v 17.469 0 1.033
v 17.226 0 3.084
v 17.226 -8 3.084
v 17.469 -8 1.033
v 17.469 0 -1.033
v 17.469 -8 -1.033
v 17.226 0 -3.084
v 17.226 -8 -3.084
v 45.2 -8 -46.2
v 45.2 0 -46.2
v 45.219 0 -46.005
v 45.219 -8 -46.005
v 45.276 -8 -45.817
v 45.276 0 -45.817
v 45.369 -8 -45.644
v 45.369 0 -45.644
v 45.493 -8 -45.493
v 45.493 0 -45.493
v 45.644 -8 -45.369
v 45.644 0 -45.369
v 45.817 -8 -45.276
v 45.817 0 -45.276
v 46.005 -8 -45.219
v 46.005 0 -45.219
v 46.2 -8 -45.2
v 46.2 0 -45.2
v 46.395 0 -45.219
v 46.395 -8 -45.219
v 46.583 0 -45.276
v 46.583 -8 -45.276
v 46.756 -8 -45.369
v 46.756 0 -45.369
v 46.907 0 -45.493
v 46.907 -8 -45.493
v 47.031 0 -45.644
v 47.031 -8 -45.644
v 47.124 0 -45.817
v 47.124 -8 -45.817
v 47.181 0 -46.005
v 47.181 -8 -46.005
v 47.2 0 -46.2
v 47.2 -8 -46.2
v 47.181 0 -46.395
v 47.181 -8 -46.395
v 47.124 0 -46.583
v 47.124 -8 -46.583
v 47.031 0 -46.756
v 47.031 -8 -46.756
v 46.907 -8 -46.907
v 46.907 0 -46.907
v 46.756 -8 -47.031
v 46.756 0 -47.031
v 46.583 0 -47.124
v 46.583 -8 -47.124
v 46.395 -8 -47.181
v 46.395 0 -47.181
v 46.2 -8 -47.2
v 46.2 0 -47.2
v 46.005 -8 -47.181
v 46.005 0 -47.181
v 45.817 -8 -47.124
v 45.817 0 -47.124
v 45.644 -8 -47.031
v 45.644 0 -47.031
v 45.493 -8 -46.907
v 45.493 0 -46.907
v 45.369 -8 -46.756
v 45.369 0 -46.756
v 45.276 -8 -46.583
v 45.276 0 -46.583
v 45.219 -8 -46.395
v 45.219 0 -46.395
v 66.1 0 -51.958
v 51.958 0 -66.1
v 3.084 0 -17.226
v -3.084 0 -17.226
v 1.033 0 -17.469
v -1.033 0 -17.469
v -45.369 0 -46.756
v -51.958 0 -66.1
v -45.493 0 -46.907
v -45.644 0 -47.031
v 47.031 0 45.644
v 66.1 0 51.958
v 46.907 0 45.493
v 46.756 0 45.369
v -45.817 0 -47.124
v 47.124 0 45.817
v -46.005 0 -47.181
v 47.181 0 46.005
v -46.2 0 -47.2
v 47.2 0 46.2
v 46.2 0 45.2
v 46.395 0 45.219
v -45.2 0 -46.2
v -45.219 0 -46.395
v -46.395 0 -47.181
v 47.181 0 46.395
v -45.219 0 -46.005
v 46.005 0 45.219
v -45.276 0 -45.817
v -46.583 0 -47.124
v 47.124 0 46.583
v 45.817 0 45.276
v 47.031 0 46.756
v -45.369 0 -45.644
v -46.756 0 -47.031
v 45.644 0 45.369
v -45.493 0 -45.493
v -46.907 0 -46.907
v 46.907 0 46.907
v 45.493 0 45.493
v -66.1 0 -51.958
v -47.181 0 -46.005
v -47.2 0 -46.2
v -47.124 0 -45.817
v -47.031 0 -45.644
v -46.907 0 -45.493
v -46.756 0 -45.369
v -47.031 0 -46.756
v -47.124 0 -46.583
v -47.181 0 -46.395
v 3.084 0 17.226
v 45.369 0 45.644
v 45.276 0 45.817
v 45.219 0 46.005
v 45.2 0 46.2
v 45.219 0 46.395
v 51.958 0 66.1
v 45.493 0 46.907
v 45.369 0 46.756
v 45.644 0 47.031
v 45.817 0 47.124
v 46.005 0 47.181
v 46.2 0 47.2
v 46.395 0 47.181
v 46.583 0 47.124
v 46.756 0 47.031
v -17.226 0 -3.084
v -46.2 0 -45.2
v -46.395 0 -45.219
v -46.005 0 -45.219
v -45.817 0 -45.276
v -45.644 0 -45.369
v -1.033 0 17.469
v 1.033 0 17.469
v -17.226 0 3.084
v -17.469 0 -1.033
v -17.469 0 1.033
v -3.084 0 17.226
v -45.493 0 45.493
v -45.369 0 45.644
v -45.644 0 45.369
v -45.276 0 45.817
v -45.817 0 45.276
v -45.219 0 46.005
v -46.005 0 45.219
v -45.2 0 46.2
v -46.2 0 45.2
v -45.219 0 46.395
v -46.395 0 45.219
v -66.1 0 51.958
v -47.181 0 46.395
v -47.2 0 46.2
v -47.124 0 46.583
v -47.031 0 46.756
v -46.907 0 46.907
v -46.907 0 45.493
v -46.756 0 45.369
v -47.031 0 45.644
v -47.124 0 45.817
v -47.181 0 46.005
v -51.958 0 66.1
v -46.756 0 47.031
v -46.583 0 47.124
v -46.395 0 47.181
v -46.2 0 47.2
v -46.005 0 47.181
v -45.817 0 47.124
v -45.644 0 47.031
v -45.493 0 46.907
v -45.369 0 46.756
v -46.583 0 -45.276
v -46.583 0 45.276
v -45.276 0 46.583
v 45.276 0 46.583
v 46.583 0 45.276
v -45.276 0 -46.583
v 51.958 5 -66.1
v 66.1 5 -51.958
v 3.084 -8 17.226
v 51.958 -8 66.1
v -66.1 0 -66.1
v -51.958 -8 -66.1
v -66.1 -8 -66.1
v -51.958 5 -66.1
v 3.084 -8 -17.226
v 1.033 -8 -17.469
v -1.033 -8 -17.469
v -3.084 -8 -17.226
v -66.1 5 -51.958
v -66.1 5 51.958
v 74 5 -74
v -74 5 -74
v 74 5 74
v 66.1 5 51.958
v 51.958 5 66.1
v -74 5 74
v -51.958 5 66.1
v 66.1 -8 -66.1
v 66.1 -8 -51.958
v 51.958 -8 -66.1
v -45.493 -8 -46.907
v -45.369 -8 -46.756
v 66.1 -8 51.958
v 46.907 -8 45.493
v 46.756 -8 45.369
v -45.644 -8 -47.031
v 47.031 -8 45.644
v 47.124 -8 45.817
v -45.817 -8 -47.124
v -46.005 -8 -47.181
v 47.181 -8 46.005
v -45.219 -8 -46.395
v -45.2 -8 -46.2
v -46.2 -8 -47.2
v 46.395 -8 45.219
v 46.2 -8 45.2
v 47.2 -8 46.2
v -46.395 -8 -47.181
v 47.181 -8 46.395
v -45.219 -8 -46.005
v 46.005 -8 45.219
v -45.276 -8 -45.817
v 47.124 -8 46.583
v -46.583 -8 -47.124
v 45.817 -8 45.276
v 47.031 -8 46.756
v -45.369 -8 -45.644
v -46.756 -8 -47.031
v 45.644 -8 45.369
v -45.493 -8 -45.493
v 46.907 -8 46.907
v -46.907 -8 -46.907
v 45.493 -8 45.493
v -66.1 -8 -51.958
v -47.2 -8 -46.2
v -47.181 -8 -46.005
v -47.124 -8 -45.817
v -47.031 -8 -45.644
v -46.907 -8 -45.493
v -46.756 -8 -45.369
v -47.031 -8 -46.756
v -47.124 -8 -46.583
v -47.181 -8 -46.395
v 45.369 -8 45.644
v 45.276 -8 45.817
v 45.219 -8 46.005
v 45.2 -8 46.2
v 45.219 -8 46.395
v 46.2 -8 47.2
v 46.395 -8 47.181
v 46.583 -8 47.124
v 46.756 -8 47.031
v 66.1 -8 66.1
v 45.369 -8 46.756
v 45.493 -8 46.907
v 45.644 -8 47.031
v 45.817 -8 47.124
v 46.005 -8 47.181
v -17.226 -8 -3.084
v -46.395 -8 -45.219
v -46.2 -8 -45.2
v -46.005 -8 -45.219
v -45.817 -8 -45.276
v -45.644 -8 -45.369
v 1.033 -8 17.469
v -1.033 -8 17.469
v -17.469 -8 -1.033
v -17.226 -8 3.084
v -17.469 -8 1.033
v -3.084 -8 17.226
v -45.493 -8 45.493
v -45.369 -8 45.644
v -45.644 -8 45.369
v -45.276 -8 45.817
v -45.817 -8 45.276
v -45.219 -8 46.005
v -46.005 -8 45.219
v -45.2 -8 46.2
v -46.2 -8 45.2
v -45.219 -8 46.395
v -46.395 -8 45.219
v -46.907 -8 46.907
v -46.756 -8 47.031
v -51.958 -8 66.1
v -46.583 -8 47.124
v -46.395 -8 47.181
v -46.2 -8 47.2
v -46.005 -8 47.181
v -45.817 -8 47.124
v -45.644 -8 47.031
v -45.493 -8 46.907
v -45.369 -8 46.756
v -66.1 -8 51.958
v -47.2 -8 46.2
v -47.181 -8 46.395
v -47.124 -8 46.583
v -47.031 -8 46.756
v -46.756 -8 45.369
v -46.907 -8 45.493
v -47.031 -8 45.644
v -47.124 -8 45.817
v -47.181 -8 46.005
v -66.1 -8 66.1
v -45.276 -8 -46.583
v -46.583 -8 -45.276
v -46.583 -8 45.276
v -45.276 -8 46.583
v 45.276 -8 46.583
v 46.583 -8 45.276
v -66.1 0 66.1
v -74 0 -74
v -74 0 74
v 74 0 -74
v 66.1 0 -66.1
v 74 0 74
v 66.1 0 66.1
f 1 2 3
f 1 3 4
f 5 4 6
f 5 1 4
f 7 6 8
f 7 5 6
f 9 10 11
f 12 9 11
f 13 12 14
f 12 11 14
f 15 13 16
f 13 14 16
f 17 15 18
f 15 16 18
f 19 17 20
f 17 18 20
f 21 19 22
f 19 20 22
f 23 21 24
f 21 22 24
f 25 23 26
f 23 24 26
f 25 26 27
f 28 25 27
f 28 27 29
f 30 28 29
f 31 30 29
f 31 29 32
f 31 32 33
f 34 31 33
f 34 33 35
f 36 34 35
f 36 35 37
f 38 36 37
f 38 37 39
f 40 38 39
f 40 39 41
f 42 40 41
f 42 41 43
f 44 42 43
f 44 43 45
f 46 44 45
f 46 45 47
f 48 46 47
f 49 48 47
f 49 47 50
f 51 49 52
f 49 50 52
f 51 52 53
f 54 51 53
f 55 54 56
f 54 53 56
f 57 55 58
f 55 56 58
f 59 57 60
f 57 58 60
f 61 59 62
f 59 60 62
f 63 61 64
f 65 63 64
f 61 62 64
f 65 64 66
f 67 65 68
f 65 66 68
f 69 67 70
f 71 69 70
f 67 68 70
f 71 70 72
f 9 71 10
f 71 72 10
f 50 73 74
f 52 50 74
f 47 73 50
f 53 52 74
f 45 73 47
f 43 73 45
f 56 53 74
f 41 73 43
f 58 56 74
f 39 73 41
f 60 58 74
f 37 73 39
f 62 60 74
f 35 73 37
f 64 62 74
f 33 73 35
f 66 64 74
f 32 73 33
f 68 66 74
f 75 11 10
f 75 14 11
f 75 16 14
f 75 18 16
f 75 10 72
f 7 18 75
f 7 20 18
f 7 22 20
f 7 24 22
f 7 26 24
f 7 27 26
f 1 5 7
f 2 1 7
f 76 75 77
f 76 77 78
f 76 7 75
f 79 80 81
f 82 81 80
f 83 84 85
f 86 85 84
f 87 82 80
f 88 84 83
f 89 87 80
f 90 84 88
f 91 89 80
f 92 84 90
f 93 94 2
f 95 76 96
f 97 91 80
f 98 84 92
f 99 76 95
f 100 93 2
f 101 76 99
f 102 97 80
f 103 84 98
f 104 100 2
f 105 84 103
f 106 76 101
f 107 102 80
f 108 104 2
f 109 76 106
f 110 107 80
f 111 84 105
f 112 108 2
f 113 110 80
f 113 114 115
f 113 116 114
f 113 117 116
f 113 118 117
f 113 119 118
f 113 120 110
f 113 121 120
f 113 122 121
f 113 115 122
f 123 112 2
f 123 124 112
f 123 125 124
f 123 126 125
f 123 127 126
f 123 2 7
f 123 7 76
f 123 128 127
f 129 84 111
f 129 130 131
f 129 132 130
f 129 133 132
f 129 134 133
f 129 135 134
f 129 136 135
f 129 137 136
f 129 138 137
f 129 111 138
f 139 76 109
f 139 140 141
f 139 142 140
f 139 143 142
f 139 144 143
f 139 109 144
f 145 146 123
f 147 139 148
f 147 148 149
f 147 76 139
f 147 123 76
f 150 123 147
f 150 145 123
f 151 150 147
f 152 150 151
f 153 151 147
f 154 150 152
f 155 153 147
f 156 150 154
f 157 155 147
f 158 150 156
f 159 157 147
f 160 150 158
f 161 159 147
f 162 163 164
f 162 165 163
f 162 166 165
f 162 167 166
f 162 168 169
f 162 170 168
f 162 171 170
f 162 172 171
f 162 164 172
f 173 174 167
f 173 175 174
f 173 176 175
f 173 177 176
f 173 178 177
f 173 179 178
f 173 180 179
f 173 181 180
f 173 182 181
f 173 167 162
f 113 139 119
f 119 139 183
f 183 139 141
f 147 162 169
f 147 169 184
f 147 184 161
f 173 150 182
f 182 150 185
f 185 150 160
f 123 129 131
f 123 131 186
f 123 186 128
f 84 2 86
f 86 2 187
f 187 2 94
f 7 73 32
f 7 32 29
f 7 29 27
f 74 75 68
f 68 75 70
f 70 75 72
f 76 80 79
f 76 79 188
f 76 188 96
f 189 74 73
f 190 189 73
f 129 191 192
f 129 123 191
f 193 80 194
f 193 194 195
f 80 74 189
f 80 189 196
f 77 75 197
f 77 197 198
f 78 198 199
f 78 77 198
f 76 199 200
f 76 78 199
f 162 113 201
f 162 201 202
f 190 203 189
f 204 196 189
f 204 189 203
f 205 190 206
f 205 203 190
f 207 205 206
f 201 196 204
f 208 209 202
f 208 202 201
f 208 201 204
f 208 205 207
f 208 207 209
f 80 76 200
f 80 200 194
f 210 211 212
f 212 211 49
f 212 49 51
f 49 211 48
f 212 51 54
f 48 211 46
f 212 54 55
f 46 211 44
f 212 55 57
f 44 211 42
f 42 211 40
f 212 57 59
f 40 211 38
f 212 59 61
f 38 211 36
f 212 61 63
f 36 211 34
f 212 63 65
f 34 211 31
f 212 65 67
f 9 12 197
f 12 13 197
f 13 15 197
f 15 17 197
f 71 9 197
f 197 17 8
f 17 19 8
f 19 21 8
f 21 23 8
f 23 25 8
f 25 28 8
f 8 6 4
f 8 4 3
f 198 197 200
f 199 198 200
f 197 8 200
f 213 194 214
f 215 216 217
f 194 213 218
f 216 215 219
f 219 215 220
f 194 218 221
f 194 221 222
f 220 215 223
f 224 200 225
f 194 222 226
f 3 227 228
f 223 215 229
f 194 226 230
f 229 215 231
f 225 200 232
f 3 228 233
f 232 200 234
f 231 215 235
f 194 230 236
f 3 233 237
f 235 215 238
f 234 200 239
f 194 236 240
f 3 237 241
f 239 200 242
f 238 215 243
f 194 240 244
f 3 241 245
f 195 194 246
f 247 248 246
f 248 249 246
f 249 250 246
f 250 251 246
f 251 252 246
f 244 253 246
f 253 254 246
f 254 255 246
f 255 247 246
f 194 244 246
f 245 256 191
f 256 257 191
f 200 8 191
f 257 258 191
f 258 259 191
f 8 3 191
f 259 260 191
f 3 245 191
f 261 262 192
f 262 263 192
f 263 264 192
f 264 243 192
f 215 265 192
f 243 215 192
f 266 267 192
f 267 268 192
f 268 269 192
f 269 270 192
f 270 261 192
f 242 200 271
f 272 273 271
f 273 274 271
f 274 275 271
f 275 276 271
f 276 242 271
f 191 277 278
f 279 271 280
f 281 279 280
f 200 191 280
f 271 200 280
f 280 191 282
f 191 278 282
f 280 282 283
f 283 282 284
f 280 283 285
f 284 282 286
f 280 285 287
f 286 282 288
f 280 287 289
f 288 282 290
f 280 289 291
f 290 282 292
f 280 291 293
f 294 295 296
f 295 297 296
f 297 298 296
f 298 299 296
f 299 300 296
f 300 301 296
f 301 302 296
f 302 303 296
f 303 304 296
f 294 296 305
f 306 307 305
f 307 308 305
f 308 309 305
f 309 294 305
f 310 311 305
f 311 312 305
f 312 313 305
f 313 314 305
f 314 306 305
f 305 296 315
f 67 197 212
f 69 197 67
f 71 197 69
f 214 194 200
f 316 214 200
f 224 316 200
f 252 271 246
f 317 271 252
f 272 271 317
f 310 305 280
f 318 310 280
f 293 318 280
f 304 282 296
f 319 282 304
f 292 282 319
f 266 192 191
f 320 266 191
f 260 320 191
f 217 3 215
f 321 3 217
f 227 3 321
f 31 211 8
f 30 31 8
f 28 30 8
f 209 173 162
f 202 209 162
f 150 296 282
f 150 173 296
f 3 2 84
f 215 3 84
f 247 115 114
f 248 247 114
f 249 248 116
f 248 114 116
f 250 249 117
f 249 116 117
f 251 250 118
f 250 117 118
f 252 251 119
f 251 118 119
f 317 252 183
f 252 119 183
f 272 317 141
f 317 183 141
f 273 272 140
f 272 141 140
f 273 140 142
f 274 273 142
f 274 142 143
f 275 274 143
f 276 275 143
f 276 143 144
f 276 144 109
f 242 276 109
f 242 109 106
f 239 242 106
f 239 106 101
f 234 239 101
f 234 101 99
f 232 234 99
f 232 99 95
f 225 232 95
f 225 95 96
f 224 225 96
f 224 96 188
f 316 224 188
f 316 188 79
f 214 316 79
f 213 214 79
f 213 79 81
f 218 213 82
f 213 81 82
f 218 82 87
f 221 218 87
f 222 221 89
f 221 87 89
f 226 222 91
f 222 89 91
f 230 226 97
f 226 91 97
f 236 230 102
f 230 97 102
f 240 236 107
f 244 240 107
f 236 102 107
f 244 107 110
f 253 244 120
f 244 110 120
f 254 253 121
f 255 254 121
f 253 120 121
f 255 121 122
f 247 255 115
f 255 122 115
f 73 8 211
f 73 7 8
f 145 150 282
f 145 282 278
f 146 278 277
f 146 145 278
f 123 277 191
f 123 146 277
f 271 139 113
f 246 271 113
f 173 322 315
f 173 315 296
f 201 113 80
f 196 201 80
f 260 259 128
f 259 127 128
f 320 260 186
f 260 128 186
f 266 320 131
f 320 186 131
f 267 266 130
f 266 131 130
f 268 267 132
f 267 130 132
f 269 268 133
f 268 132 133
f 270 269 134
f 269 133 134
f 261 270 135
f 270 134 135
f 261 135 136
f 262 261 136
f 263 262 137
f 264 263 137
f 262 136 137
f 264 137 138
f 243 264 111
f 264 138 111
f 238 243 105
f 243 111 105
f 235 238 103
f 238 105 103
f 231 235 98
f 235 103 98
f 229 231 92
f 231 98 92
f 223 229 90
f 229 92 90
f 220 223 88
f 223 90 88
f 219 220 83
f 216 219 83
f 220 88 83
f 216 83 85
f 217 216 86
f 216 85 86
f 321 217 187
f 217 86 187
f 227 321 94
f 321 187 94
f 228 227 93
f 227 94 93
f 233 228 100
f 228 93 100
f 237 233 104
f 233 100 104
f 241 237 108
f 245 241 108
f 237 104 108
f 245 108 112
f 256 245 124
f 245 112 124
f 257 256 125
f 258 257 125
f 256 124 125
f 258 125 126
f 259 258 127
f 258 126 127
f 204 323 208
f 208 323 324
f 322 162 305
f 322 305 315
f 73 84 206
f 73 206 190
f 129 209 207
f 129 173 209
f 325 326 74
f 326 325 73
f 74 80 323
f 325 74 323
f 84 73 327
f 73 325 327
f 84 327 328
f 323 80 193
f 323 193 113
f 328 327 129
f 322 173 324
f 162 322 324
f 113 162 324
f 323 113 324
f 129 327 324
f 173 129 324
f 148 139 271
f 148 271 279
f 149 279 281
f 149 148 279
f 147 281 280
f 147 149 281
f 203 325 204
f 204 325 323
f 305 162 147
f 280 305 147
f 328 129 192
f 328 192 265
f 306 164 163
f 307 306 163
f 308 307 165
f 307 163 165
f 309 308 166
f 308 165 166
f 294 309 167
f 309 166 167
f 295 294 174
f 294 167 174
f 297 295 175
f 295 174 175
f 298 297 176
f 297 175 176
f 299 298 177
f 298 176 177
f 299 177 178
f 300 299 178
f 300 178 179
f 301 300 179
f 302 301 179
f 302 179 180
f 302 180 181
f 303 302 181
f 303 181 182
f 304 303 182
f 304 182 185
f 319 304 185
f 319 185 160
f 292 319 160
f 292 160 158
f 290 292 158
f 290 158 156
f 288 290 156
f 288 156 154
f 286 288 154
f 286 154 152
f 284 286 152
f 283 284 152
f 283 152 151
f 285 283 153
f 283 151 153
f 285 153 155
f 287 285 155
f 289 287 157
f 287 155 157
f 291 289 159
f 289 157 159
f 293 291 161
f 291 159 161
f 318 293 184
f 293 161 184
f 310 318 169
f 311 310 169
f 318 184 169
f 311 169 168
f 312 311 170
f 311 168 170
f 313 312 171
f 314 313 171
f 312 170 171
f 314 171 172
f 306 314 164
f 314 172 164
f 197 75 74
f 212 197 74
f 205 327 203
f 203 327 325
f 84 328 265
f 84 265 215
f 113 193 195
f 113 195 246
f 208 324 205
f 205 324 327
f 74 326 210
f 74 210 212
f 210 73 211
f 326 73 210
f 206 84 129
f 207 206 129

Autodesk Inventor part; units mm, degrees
ref_plane "YZ Plane" through (0, 0, 0) normal (1, 0, 0) x (0, 1, 0)
ref_plane "XZ Plane" through (0, 0, 0) normal (0, 1, 0) x (-1, 0, 0)
ref_plane "XY Plane" through (0, 0, 0) normal (0, 0, 1) x (1, 0, 0)
sketch "Sketch1" plane through (0, 0, 0) normal (0, 1, 0) x (-1, 0, 0)
  line L0 (-81.5, 81.5) -> (81.5, -81.5) construction
  line L1 (-81.5, -81.5) -> (81.5, 81.5) construction
  line L2 (-66.3, 66.3) -> (66.3, -66.3) construction
  line L3 (-66.3, -66.3) -> (66.3, 66.3) construction
  line L4 (-81.9, 81.9) -> (-81.9, -81.9)
  line L5 (-81.9, -81.9) -> (81.9, -81.9)
  line L6 (81.9, -81.9) -> (81.9, 81.9)
  line L7 (81.9, 81.9) -> (-81.9, 81.9)
  line L8 (-66.1, 66.1) -> (-66.1, -66.1)
  line L9 (-66.1, -66.1) -> (66.1, -66.1)
  line L10 (66.1, -66.1) -> (66.1, 66.1)
  line L11 (66.1, 66.1) -> (-66.1, 66.1)
  line L12 (-66.1, 66.1) -> (66.1, -66.1) construction
  line L13 (-66.1, -66.1) -> (66.1, 66.1) construction
  line L14 (66.1, 51.9579) -> (17.2261, 3.084)
  line L15 (51.9579, 66.1) -> (3.084, 17.2261)
  line L16 (66.1, -51.9579) -> (14.1421, 0) construction
  line L17 (50.106, -64.2481) -> (3.084, -17.2261)
  arc A0 (-17.2261, -3.084) -> (-3.084, -17.2261) centre (0, 0) ccw
  arc A1 (-17.2261, 3.084) -> (-17.2261, -3.084) centre (0, 0) ccw
  line L18 (-14.1421, 0) -> (-17.2261, -3.084) construction
  line L19 (-3.084, 17.2261) -> (-51.9579, 66.1)
  line L20 (3.084, 17.2261) -> (0, 14.1421) construction
  line L21 (0, 14.1421) -> (-14.1421, 0) construction
  line L22 (14.1421, 0) -> (-3.084, 17.2261) construction
  arc A2 (17.2261, 3.084) -> (-17.2261, 3.084) centre (0, 0) ccw
  arc A3 (17.2261, -3.084) -> (17.2261, 3.084) centre (0, 0) ccw
  arc A4 (-3.084, -17.2261) -> (17.2261, -3.084) centre (0, 0) ccw
  line L23 (3.084, -17.2261) -> (0, -14.1421) construction
  line L24 (0, -14.1421) -> (-14.1421, 0) construction
  line L25 (17.2261, 3.084) -> (-3.084, -17.2261) construction
  line L26 (-3.084, -17.2261) -> (-51.9579, -66.1)
  line L27 (-17.2261, -3.084) -> (-66.1, -51.9579)
  line L28 (-17.2261, 3.084) -> (-64.2481, 50.106)
  line L29 (-14.1421, 0) -> (-17.2261, 3.084) construction
  line L30 (17.2261, -3.084) -> (66.1, -51.9579)
  line L31 (50.106, -64.2481) -> (51.9579, -66.1)
  line L32 (-64.2481, 50.106) -> (-66.1, 51.9579)
  line L33 (46.2, 46.2) -> (-46.2, 46.2) construction
  line L34 (-46.2, 46.2) -> (-46.2, -46.2) construction
  line L35 (-46.2, -46.2) -> (46.2, -46.2) construction
  line L36 (46.2, -46.2) -> (46.2, 46.2) construction
  line L37 (46.2, 46.2) -> (-46.2, -46.2) construction
  line L38 (-46.2, 46.2) -> (46.2, -46.2) construction
  circle A5 centre (46.2, -46.2) radius 1
  circle A6 centre (-46.2, -46.2) radius 1
  circle A7 centre (-46.2, 46.2) radius 1
  circle A8 centre (46.2, 46.2) radius 1
  line L39 (51.9579, 66.1) -> (66.1, 51.9579)
  line L40 (66.1, -51.9579) -> (51.9579, -66.1)
  line L41 (-51.9579, -66.1) -> (-66.1, -51.9579)
  line L42 (-66.1, 51.9579) -> (-51.9579, 66.1)
  line L43 (-74, 74) -> (-74, -74)
  line L44 (-74, -74) -> (74, -74)
  line L45 (74, -74) -> (74, 74)
  line L46 (74, 74) -> (-74, 74)
  line L47 (-74, 74) -> (74, -74) construction
  line L48 (-74, -74) -> (74, 74) construction
  dimension "d0" = 163
  dimension "d1" = 163
  dimension "d2" = 132.6
  dimension "d3" = 132.6
  dimension "d5" = 163.8
  dimension "d6" = 163.8
  dimension "d7" = 132.2
  dimension "d8" = 132.2
  dimension "d9" = 20
  dimension "d10" = 20
  dimension "d11" = 35
  dimension "d12" = 92.4
  dimension "d13" = 92.4
  dimension "d14" = 2
  dimension "d15" = 2
  dimension "d16" = 2
  dimension "d17" = 2
  dimension "d28" = 148
  dimension "d29" = 148
extrude "Extrusion1" add sketch "Sketch1" along normal blind 5 contours L7 L6 L5 L4 | L46 L45 L44 L43
extrude "Extrusion2" add sketch "Sketch1" along normal blind 5 contours L11 L42 L8 | L41 L9 L8 | L11 L10 L39 | L40 L10 L9
extrude "Extrusion4" cut sketch "Sketch1" against normal blind 10 contours L11 L42 L8 | L42 L19 A2 L28 L32 | L41 L9 L8 | L27 A0 L26 L41 | L39 L14 A2 L15 | L11 L10 L39 | A2 A3 A4 A0 A1 | L40 L10 L9 | L31 L17 A4 L30 L40 | A7
extrude "Extrusion5" add sketch "Sketch1" against normal blind 8 contours L11 L42 L8 | L42 L19 A2 L28 L32 | L41 L9 L8 | L27 A0 L26 L41 | L39 L14 A2 L15 | L11 L10 L39 | A2 A3 A4 A0 A1 | L40 L10 L9 | L31 L17 A4 L30 L40
extrude "Extrusion6" cut sketch "Sketch1" along normal blind 8 contours L7 L6 L5 L4
properties part number "Lifting Motor Platform"
